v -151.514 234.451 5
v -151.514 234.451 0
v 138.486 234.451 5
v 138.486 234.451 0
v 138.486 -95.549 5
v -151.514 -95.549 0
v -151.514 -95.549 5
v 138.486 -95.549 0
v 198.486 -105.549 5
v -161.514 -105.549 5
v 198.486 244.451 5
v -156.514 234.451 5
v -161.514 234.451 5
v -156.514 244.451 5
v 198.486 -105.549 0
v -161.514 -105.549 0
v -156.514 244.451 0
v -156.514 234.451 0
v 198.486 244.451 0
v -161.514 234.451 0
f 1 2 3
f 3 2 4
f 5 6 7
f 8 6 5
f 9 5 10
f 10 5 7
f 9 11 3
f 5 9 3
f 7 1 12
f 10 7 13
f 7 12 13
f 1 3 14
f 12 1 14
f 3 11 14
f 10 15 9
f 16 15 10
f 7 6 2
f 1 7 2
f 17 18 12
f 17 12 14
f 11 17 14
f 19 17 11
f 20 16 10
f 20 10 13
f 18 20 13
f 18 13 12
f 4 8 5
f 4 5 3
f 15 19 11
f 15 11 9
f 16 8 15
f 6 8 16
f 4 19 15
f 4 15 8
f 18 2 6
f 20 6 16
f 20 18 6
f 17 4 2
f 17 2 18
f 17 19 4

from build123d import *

# Parameters (mm, degrees)
CROQUIS1_W              = 290
CROQUIS1_H              = 330
SALIENTE_EXTRUIR1_DEPTH = 5


with BuildPart() as part:
    # Croquis1 → Saliente-Extruir1 (new body)
    with BuildSketch(Plane.XY):
        Polygon((-156.514277167, 244.450688952), (198.485722833, 244.450688952), (198.485722833, -105.549311048), (-161.514277167, -105.549311048), (-161.514277167, 234.450688952), (-156.514277167, 234.450688952), align=None)
        with Locations((-6.514277167, 69.450688952)):
            Rectangle(CROQUIS1_W, CROQUIS1_H, mode=Mode.SUBTRACT)
    extrude(amount=SALIENTE_EXTRUIR1_DEPTH)


solid = part.part
